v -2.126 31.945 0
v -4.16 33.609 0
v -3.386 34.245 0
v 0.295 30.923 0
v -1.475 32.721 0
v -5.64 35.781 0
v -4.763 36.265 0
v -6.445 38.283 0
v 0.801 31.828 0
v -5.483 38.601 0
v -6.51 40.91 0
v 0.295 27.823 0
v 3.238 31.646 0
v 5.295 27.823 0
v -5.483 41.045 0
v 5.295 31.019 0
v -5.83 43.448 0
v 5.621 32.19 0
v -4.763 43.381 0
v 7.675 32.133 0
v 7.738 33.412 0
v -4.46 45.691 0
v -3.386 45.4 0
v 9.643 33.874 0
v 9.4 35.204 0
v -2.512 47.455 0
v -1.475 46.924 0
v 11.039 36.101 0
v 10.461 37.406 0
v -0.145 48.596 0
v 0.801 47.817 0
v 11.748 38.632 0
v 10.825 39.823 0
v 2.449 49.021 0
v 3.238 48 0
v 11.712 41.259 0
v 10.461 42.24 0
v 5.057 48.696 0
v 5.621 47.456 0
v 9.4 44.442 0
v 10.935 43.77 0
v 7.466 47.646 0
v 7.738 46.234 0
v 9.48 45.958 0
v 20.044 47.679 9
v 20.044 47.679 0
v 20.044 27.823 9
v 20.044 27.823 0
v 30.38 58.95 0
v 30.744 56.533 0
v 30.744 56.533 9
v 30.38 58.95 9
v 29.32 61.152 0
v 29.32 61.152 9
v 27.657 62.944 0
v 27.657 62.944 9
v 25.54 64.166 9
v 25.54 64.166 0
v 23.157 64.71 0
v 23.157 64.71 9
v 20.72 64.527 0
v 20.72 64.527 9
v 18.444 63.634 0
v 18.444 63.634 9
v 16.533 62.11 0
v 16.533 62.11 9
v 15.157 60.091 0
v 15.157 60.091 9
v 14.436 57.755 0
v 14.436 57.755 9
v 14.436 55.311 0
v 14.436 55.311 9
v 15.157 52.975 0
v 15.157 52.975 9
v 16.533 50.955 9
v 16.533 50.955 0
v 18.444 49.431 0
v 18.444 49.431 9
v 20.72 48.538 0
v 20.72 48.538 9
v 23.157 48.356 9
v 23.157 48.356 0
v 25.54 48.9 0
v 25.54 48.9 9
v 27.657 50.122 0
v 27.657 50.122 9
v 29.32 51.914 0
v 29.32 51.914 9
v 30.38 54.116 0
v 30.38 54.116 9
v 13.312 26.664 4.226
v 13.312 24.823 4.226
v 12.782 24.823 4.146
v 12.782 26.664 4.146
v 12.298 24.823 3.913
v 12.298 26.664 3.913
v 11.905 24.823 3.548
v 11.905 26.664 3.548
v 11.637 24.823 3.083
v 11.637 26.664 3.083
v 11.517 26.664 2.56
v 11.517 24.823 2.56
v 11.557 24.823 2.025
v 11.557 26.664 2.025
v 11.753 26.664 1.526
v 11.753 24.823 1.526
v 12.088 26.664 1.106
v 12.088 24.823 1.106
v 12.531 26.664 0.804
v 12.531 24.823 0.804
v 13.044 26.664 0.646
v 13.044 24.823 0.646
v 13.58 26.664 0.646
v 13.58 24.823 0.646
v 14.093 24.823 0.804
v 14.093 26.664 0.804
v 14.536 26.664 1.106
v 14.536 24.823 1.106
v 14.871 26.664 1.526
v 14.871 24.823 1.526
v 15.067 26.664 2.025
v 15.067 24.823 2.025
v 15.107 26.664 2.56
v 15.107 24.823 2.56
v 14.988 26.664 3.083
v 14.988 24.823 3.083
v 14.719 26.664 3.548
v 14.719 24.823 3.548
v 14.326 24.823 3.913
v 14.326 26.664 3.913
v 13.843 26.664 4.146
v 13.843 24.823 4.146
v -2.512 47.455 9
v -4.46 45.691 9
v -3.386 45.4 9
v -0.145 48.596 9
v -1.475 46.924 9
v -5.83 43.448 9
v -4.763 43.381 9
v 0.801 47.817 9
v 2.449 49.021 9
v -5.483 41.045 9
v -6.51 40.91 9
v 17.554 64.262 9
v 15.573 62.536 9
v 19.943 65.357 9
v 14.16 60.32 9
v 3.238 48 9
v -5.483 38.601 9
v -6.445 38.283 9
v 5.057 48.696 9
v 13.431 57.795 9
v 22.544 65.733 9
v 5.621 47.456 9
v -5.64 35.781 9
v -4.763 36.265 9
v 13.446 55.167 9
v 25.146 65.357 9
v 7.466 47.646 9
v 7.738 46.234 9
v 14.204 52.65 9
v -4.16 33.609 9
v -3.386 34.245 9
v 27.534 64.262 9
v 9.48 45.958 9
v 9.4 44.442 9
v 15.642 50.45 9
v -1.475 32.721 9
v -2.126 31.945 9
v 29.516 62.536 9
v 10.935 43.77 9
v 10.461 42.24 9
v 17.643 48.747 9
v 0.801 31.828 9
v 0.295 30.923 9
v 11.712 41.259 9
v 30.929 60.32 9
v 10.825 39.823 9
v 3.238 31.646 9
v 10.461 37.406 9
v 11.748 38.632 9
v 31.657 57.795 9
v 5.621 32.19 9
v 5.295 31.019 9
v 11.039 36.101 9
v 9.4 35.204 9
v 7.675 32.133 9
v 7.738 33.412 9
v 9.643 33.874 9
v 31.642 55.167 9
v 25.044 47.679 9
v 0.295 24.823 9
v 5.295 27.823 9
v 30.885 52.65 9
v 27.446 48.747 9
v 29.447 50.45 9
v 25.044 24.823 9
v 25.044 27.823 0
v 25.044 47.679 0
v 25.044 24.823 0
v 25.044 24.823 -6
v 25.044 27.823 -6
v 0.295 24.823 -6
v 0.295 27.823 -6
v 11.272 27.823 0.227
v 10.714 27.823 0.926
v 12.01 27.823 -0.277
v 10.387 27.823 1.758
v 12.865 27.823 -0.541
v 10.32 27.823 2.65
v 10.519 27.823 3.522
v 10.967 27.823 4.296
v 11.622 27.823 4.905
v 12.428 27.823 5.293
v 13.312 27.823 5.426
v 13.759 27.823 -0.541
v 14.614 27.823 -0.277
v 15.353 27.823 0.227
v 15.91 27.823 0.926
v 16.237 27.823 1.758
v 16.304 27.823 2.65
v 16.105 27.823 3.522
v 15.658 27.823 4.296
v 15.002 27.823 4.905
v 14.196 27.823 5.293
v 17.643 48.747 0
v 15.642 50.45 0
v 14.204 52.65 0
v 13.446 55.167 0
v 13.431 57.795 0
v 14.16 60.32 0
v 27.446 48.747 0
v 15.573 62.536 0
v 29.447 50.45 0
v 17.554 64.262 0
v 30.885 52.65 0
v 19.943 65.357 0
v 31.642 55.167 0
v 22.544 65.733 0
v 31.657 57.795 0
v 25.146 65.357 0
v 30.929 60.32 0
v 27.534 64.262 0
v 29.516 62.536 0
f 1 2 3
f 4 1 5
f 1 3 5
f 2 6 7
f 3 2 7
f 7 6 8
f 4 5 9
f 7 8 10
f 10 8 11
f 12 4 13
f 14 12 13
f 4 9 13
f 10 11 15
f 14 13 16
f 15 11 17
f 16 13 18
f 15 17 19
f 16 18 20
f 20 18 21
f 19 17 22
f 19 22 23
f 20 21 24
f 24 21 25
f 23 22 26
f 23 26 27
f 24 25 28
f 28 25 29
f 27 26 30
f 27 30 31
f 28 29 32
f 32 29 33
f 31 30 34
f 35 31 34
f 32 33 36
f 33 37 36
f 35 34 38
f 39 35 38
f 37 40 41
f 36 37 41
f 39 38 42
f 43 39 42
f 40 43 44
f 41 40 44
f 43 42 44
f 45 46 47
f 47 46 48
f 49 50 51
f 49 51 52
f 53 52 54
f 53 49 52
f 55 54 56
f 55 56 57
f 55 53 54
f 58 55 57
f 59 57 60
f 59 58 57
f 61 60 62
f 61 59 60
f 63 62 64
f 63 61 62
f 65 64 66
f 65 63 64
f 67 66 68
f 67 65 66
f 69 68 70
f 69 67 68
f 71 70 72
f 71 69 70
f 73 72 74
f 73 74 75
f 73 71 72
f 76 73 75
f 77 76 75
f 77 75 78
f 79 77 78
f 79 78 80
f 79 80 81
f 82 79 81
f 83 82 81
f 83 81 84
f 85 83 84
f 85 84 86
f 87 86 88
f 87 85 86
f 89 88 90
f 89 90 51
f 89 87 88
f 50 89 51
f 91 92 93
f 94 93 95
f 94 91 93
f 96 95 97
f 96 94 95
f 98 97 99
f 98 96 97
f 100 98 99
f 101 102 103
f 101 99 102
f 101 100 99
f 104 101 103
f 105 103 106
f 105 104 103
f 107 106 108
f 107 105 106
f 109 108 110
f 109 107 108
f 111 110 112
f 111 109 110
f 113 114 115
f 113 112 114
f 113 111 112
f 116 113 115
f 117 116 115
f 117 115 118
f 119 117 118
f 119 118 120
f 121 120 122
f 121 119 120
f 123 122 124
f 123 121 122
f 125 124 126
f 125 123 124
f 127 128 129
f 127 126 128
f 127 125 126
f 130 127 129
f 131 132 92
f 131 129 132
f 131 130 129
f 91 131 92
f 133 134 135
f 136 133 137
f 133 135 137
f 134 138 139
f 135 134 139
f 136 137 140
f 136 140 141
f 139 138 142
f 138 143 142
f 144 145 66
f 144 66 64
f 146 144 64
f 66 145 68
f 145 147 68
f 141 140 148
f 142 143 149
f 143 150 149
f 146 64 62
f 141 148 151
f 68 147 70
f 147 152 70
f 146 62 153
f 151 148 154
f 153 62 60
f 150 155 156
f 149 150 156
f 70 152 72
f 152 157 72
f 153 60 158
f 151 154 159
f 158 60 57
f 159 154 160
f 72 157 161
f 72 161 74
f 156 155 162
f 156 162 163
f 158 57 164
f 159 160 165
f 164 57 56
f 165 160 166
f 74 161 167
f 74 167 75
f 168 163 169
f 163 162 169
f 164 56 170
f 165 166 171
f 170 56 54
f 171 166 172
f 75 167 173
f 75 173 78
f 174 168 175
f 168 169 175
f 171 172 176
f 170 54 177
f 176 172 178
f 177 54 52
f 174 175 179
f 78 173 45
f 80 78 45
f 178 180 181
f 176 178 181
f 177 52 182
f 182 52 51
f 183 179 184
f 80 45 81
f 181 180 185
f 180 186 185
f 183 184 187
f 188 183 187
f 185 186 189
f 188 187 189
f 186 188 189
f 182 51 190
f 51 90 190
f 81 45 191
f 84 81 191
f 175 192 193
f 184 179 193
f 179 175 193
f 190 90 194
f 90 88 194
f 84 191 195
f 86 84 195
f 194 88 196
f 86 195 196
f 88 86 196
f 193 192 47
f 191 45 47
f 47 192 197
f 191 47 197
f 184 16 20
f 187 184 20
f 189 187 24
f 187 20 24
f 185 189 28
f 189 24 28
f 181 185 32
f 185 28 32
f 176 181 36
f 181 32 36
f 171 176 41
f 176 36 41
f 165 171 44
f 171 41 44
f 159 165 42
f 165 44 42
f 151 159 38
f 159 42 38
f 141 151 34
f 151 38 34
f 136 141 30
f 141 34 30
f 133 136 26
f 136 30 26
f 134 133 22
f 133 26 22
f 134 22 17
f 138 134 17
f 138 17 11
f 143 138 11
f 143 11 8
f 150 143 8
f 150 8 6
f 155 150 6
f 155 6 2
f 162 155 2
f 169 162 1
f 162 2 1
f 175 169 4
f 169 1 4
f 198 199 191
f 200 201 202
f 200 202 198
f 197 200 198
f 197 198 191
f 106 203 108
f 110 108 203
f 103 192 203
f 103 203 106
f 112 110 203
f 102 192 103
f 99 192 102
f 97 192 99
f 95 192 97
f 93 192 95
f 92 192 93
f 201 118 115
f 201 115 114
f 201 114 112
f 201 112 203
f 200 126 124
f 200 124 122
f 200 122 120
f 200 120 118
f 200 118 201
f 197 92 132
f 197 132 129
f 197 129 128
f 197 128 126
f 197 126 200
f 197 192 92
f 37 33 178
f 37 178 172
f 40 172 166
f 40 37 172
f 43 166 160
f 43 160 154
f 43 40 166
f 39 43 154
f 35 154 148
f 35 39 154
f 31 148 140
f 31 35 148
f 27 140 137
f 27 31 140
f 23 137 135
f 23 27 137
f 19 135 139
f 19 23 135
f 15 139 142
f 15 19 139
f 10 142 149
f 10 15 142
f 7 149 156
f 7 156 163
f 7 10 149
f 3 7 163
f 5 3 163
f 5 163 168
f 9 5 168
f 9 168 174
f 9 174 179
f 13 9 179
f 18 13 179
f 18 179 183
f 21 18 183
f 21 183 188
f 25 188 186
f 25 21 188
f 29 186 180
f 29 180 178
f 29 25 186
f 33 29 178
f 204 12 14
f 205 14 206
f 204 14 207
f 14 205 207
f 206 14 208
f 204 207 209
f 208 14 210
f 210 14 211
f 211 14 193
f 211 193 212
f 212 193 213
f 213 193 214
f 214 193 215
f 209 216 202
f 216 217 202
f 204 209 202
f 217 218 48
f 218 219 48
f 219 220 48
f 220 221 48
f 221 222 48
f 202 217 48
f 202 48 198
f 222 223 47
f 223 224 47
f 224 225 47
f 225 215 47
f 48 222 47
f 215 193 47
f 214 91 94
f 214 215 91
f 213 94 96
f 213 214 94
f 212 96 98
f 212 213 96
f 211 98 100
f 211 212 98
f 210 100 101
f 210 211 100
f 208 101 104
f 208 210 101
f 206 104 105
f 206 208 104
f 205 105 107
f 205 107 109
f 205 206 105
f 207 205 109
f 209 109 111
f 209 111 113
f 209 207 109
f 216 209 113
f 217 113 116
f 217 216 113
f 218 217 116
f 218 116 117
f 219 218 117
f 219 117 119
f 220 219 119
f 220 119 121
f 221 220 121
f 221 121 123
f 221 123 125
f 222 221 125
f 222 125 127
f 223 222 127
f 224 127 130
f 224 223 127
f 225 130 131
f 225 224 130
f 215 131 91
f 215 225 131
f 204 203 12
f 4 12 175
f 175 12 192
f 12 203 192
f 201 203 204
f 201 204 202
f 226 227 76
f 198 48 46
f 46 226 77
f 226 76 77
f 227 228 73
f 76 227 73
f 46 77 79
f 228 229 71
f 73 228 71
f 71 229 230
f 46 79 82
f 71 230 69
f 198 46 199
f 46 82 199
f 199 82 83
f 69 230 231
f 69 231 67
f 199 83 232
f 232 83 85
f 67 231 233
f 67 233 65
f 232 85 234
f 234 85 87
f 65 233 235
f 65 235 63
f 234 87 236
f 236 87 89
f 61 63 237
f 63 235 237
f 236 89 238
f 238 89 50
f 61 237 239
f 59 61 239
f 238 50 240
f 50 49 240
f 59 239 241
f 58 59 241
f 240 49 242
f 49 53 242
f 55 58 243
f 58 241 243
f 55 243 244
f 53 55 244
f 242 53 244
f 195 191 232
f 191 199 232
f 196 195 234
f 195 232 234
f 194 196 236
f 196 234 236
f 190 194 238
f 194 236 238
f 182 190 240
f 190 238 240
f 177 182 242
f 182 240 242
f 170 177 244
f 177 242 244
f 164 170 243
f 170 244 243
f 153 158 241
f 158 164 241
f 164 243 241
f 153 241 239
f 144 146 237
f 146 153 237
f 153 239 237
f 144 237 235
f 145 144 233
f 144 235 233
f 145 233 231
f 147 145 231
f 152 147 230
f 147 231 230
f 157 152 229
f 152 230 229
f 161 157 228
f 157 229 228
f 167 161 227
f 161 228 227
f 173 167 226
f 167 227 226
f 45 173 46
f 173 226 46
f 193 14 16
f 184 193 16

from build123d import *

# Parameters (mm, degrees)
SKETCH1_R             = 9.2
SKETCH1_R_2           = 8.2
BOSS_EXTRUDE1_DEPTH   = 9
BOSS_EXTRUDE1_2_DEPTH = 9
BOSS_EXTRUDE2_DEPTH   = 9
SKETCH3_W             = 24.749470463
SKETCH3_H             = 15
BOSS_EXTRUDE3_DEPTH   = 3


with BuildPart() as part:
    # Sketch1 → Boss-Extrude1 (new body)
    with BuildSketch(Plane.XY):
        with Locations((22.544450453, 56.532786317)):
            Circle(SKETCH1_R)
        with Locations((22.544450453, 56.532786317)):
            Circle(SKETCH1_R_2, mode=Mode.SUBTRACT)
    extrude(amount=BOSS_EXTRUDE1_DEPTH)



with BuildPart() as body_2:
    # Sketch1 → Boss-Extrude1 2 (new body)
    with BuildSketch(Plane.XY):
        with Locations((2.62521603, 39.822786317)):
            Circle(SKETCH1_R)
        with Locations((2.62521603, 39.822786317)):
            Circle(SKETCH1_R_2, mode=Mode.SUBTRACT)
    extrude(amount=BOSS_EXTRUDE1_2_DEPTH)


with BuildPart() as part_1:
    add(part.part)

    add(body_2.part)  # Boss-Extrude2 merges body 2
    # Sketch2 → Boss-Extrude2 (add)
    with BuildSketch(Plane.XY):
        with BuildLine():
            Line((0.29497999, 24.822786317), (5.29497999, 24.822786317))
            Line((5.29497999, 24.822786317), (5.29497999, 31.018675891))
            ThreePointArc((5.29497999, 31.018675891), (2.801620408, 30.624477696), (0.29497999, 30.922786317))
            Line((0.29497999, 30.922786317), (0.29497999, 24.822786317))
        make_face()
        with BuildLine():
            Line((20.044450453, 47.722786317), (20.044450453, 24.822786317))
            Line((20.044450453, 24.822786317), (25.044450453, 24.822786317))
            Line((25.044450453, 24.822786317), (25.044450453, 47.722786317))
            ThreePointArc((25.044450453, 47.722786317), (22.544450453, 47.332786317), (20.044450453, 47.722786317))
        make_face()
    extrude(amount=BOSS_EXTRUDE2_DEPTH)

    # Sketch3 → Boss-Extrude3 (add)
    with BuildSketch(Plane.XZ.offset(-24.822786317)):
        with Locations((12.669715222, 1.5)):
            Rectangle(SKETCH3_W, SKETCH3_H)
    extrude(amount=-BOSS_EXTRUDE3_DEPTH)

    # Sketch5 → Avellanado para tornillo con cabeza avellanada en cruz de M31 (revolve, cut)
    with BuildSketch(Plane(origin=(13.312105777, 27.822786317, 2.425807985), x_dir=(0, 0, 1), z_dir=(1, 0, 0))):
        Polygon((0, 0), (0, 11.081549114), (1.8, 10), (1.8, 1.15882653), (3, 0), align=None)
    revolve(axis=Axis((13.312105777, 34.172786317, 2.425807985), (0, -1, 0)), mode=Mode.SUBTRACT)


solid = part_1.part
